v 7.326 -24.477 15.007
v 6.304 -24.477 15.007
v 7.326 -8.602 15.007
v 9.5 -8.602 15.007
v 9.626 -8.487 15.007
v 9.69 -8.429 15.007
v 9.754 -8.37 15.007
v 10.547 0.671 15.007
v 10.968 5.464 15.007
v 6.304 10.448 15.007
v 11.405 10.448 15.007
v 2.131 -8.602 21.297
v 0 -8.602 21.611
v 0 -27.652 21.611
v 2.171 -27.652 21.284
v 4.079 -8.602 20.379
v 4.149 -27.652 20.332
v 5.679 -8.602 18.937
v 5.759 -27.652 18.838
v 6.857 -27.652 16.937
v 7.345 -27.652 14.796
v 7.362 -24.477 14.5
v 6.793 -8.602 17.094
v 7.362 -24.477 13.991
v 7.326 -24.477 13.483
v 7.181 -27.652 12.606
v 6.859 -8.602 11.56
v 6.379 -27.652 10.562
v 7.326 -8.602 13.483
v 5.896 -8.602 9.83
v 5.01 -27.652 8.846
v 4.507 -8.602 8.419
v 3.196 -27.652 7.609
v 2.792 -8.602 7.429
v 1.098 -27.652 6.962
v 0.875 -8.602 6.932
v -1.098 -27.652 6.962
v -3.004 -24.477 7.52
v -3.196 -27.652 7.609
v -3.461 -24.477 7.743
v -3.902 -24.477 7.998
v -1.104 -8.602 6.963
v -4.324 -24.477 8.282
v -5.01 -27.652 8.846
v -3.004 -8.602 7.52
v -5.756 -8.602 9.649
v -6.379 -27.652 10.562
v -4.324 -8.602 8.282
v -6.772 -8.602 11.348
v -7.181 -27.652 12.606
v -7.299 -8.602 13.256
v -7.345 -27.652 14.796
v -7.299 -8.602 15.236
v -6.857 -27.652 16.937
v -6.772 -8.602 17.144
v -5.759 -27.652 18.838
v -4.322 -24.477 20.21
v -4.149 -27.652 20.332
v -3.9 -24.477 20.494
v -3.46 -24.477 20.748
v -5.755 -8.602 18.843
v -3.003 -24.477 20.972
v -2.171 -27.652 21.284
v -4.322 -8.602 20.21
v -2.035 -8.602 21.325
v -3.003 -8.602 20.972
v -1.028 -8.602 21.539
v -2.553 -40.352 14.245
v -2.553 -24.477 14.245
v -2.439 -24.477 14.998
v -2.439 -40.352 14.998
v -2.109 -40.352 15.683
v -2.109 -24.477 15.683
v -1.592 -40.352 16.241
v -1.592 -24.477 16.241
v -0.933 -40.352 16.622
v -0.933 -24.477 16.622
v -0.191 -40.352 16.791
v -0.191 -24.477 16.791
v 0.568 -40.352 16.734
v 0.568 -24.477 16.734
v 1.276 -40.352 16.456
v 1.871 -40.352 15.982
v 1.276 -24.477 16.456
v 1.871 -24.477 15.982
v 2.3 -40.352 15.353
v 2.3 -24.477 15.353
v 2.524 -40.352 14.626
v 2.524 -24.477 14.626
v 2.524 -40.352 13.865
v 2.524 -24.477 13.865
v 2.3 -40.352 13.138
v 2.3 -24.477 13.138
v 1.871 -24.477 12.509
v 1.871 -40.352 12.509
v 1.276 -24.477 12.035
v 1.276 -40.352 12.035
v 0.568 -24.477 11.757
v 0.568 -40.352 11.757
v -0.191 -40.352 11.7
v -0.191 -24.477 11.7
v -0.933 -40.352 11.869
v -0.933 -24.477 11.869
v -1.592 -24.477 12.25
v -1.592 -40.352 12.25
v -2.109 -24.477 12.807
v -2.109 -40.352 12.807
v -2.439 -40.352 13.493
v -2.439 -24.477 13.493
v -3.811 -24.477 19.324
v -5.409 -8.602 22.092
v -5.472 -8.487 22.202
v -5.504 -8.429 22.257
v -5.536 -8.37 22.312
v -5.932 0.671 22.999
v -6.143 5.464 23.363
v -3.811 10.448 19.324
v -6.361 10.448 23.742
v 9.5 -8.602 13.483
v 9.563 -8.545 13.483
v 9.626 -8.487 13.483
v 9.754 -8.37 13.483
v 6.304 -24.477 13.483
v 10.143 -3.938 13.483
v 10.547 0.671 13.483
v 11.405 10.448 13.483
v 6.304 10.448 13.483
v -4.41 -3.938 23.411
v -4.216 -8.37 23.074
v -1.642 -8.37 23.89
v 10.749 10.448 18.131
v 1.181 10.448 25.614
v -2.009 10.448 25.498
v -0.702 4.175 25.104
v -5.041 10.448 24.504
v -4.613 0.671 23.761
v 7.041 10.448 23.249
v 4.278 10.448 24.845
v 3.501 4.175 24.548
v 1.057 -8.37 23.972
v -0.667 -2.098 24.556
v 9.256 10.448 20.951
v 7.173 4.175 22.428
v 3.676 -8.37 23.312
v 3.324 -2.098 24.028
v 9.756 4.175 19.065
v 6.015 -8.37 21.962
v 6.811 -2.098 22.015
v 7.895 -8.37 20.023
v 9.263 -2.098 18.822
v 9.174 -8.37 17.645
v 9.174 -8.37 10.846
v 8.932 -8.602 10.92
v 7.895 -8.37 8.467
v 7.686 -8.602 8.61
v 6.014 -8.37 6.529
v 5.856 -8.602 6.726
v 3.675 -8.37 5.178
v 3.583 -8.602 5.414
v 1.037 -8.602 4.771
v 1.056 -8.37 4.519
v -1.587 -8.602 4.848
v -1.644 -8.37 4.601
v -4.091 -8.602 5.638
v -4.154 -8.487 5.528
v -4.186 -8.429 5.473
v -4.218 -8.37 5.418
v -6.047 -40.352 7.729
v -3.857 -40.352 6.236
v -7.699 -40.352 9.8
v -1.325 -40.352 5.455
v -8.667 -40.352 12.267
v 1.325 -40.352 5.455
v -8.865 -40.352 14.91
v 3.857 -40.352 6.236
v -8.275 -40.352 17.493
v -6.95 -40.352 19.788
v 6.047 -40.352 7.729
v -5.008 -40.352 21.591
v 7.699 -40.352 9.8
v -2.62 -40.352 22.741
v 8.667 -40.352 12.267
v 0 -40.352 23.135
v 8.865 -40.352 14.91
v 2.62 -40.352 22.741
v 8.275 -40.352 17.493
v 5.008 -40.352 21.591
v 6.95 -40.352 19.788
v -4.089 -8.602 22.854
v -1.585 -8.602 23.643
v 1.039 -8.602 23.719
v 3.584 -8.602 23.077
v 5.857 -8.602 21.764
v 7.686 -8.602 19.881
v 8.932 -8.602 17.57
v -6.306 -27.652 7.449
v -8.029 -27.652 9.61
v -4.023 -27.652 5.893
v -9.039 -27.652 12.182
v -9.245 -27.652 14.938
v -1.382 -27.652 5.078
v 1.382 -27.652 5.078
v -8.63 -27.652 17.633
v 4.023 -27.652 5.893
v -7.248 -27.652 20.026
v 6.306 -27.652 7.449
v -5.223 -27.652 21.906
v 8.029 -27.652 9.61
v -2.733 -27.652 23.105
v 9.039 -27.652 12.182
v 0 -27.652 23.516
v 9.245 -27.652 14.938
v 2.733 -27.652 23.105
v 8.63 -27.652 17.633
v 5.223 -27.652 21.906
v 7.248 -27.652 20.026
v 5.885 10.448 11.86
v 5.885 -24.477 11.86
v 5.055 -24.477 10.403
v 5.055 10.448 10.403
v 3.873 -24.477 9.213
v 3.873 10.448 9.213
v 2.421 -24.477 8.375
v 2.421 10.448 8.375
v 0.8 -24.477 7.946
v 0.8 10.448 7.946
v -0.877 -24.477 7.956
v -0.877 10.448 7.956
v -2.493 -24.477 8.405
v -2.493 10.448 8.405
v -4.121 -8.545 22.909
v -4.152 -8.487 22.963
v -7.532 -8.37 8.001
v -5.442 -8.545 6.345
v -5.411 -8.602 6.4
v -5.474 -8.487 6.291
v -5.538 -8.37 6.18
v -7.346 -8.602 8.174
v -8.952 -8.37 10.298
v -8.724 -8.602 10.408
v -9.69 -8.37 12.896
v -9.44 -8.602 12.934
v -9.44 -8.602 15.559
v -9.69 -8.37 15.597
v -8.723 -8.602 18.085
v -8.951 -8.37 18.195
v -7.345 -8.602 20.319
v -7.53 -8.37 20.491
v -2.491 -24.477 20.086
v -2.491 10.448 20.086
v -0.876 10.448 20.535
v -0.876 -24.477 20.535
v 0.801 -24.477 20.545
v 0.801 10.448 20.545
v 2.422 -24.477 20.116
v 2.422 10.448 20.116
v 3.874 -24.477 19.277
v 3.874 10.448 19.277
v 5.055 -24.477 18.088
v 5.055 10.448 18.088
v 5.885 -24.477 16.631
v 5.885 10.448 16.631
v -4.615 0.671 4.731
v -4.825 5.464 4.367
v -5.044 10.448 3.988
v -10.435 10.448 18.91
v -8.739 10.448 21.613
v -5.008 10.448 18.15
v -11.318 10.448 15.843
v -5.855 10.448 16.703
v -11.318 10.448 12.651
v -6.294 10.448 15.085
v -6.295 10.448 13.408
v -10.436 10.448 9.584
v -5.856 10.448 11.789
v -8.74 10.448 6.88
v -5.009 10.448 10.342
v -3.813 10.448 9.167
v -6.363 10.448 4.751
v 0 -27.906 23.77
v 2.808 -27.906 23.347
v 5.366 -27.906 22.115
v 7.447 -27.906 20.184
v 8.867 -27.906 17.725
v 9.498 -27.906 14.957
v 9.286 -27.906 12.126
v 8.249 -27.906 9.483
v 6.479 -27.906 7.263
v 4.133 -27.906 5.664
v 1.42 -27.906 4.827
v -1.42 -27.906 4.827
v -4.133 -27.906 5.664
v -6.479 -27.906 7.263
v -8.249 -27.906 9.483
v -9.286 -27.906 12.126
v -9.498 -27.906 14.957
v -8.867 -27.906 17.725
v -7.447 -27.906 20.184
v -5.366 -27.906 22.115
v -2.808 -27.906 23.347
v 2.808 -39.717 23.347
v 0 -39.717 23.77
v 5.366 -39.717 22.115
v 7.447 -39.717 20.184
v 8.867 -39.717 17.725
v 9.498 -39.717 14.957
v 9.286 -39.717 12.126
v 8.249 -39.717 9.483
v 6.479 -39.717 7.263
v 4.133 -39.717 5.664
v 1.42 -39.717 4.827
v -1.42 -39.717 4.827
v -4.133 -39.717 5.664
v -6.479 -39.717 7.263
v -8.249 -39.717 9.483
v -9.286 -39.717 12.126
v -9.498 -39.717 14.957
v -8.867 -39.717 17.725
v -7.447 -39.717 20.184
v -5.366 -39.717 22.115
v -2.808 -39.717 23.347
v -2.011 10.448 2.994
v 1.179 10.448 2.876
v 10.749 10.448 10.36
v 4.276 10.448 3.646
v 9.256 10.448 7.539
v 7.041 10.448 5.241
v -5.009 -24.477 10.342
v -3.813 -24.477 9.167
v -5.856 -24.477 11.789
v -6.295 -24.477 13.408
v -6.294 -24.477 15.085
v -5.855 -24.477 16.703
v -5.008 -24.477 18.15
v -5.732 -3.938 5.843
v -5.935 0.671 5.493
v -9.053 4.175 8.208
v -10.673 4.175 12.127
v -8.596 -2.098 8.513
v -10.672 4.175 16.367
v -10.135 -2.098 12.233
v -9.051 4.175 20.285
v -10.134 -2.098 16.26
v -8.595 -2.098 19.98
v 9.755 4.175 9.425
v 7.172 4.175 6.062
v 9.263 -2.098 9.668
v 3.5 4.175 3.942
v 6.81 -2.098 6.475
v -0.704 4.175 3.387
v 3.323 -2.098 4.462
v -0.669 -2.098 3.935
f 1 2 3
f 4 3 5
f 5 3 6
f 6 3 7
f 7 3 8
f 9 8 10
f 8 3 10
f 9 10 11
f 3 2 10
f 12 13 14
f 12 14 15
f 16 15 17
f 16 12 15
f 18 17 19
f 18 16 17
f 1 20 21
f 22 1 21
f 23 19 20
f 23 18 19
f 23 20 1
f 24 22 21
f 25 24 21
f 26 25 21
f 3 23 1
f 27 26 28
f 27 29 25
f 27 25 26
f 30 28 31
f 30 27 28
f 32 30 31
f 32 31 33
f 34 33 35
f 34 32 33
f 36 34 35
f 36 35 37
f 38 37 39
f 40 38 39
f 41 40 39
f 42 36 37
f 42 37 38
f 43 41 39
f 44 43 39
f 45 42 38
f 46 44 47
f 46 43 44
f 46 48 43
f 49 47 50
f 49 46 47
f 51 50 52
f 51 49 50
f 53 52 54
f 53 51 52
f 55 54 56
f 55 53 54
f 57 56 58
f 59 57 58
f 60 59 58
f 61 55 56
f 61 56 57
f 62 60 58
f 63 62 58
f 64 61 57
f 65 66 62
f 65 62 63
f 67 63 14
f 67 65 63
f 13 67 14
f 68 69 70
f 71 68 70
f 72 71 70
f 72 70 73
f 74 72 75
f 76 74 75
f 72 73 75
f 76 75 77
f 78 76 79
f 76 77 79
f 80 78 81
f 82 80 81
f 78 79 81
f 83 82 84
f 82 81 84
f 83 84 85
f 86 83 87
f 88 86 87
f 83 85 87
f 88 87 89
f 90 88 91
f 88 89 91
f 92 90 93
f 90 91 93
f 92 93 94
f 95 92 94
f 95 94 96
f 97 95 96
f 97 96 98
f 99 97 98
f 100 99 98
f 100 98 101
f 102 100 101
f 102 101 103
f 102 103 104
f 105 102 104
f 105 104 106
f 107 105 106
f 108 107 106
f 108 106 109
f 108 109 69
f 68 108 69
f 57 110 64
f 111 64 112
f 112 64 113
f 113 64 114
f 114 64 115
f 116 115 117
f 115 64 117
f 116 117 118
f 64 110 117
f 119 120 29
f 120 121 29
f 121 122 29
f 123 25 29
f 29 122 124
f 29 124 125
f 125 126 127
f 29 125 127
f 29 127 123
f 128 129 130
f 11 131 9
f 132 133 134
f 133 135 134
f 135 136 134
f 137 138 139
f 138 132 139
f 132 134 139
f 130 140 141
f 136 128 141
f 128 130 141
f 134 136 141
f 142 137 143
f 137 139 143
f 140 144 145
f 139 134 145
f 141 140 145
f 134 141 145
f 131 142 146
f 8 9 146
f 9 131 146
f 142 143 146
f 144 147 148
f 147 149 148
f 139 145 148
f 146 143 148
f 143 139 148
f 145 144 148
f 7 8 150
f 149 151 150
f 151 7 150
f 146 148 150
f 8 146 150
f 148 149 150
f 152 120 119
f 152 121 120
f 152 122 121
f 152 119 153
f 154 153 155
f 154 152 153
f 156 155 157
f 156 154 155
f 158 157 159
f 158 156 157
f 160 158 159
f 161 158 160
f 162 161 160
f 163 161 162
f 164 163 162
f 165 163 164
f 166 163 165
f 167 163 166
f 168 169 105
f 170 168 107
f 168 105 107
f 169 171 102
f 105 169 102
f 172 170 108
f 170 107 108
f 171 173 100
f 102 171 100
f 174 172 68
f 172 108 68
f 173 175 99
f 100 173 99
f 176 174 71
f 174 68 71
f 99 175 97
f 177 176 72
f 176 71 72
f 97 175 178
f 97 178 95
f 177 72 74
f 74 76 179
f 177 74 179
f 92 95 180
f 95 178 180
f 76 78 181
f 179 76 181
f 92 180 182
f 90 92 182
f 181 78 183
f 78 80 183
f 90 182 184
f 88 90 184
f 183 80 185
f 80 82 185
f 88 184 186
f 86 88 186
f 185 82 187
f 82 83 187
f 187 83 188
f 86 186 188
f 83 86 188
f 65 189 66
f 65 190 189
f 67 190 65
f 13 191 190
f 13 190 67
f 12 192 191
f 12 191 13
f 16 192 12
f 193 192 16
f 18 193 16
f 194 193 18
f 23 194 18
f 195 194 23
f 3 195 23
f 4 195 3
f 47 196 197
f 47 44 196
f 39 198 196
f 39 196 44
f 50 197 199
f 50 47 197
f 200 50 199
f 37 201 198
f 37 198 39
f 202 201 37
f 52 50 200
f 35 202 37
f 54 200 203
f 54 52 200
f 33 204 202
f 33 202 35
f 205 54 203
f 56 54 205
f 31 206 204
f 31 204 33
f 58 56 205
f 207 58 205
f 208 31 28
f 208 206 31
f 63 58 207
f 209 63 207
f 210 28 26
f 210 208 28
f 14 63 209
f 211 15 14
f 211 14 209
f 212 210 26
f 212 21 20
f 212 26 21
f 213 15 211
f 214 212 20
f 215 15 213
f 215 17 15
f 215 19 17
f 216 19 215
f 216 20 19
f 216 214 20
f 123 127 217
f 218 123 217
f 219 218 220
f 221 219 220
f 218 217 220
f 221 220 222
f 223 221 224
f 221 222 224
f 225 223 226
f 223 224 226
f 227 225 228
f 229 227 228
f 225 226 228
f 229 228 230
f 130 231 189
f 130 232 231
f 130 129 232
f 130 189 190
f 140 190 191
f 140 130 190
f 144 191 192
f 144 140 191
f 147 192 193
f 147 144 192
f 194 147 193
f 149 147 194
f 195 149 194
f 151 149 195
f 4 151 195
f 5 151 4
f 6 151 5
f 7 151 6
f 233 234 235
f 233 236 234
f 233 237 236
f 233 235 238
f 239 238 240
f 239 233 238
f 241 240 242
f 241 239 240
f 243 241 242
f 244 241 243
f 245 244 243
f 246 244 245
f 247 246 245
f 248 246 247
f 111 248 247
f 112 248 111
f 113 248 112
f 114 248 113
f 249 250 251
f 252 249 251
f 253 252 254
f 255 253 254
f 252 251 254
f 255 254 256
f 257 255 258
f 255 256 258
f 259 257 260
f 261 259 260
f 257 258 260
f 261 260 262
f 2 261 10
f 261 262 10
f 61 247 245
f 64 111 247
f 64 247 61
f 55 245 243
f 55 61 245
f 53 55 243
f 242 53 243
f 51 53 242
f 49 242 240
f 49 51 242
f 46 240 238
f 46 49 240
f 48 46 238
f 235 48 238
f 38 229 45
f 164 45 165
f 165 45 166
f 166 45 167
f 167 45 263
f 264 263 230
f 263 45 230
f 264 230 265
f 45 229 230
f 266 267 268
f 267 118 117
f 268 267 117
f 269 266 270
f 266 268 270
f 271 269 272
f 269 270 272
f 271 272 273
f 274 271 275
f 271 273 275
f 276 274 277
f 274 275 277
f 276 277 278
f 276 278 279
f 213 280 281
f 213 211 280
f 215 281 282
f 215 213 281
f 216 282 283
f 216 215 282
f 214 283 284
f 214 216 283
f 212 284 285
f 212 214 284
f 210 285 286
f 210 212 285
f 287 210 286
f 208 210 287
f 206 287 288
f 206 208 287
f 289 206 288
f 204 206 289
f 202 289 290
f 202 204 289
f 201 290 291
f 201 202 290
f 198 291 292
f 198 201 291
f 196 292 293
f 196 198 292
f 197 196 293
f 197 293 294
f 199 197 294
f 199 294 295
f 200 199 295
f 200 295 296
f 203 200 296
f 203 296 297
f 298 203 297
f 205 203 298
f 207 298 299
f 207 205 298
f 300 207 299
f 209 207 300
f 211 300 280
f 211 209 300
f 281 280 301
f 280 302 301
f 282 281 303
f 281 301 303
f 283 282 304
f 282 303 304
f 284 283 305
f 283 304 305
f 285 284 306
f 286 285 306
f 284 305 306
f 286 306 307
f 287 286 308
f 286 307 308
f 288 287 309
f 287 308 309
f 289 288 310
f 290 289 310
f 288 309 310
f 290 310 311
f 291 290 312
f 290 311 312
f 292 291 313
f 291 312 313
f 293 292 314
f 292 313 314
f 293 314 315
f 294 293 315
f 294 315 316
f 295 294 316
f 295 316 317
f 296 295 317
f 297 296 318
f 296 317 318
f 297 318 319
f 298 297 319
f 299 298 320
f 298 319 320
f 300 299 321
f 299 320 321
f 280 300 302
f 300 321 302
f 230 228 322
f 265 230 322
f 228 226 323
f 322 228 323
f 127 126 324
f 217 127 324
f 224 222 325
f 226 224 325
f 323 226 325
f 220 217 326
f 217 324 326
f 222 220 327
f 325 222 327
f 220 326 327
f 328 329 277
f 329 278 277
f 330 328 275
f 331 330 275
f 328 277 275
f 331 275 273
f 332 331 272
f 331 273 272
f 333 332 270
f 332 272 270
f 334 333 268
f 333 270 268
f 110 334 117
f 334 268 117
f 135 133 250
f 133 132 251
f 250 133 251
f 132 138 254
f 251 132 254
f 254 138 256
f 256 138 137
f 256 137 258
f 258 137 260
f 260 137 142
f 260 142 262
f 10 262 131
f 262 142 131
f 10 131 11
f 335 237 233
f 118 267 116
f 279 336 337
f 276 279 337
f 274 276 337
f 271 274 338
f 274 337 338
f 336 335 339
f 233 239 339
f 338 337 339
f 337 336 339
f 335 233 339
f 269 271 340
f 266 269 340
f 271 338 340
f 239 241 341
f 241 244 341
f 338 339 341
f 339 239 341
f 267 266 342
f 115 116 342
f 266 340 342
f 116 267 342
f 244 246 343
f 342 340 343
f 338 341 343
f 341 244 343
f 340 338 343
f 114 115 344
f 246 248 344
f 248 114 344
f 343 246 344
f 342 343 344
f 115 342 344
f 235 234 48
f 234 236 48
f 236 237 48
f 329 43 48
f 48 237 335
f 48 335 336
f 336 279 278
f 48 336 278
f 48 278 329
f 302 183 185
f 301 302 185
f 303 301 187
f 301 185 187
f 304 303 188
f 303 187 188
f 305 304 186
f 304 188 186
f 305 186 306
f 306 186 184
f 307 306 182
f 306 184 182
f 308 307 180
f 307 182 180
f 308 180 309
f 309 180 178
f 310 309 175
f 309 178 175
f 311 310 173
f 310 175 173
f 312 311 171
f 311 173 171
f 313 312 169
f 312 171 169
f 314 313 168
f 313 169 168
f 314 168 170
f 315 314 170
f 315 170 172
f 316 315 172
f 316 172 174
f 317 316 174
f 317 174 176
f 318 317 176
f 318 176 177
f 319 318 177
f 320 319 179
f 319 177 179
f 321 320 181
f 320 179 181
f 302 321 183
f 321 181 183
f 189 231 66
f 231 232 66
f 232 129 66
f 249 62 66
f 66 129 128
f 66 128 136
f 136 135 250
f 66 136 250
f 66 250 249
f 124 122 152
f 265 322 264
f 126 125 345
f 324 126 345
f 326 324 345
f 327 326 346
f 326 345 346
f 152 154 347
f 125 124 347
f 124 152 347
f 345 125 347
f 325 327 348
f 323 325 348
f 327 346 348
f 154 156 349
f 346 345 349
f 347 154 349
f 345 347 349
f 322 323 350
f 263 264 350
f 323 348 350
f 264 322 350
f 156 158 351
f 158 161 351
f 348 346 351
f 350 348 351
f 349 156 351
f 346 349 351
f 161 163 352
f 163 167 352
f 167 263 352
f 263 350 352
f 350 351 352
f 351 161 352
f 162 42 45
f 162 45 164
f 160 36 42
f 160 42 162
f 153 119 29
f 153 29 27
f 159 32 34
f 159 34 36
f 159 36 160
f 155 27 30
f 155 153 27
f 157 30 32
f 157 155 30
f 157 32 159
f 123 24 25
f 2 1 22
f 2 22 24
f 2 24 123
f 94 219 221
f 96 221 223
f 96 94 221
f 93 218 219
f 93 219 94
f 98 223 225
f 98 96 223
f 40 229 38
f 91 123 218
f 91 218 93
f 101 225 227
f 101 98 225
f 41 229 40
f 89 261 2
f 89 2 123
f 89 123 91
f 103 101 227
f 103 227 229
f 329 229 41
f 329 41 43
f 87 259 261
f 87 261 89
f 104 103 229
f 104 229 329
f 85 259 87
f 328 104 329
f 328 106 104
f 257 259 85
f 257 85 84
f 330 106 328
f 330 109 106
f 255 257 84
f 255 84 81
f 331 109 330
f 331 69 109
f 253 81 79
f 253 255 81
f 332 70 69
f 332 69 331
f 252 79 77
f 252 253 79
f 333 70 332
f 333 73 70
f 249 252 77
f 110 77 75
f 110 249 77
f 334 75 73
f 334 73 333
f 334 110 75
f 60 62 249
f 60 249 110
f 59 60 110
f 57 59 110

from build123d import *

# Parameters (mm, degrees)
F2_R         = 6.35
F3_DEPTH     = 34.925
F5_D         = 5.1054
F9_DEPTH     = 34.925
F10_SIZE     = 0.635
F11_T4_ANGLE = 118.0970990721
F11_T6_ANGLE = 118.1103265481
F11_T8_ANGLE = 118.1037128101


# Not quite as in the source:
# - a fillet or chamfer that OpenCascade refuses, or shapes differently, is made with other operations: its cross-section is extruded or revolved along the edge and cut away or added


with BuildPart() as f1:
    # F0 (on Right) → F1 (revolve)
    with BuildSketch(Plane.YZ):
        Polygon((-11.3264165741, 23.7704595025), (-40.3521669373, 23.7704595025), (-40.3521669373, 14.2454595025), (10.4478330627, 14.2454595025), (10.4478330627, 25.6754595025), align=None)
    revolve(axis=Axis((0, -14.9521669373, 14.2454595025), (0, 1, 0)))

    # F2 (on face) → F3 (cut)
    with BuildSketch(Plane(origin=(0, 10.4478330627, 0), x_dir=(-1, 0, 0), z_dir=(0, 1, 0))):
        with Locations((0, 14.2454595025)):
            Circle(F2_R)
    extrude(amount=-F3_DEPTH, mode=Mode.SUBTRACT)

    # F5 (through all)
    with Locations(Plane.XZ.offset(40.3521669373)):
        with Locations((0, 14.2454595025)):
            Hole(F5_D / 2)

    # F6 (on Right) → F7 (revolve, cut)
    with BuildSketch(Plane.YZ):
        Polygon((-11.3264165741, 23.7704595025), (-27.6521669373, 23.7704595025), (-27.6521669373, 21.6114595025), (-8.6021669373, 21.6114595025), (-8.6021669373, 24.0088004624), align=None)
    revolve(axis=Axis((0, -14.9521669373, 14.2454595025), (0, 1, 0)), mode=Mode.SUBTRACT)

    # F8 (on face) → F9 (cut)
    with BuildSketch(Plane(origin=(0, 10.4478330627, 0), x_dir=(-1, 0, 0), z_dir=(0, 1, 0))):
        with BuildLine():
            Line((-6.3041142122, 15.0074595025), (-11.4045717149, 15.0074595025))
            ThreePointArc((-11.4045717149, 15.0074595025), (-11.43, 14.2454595025), (-11.4045717149, 13.4834595025))
            Line((-11.4045717149, 13.4834595025), (-6.3041142122, 13.4834595025))
            ThreePointArc((-6.3041142122, 13.4834595025), (-6.35, 14.2454595025), (-6.3041142122, 15.0074595025))
        make_face()
        with BuildLine():
            Line((3.8113822624, 19.3244225118), (6.3611011609, 23.7418426046))
            ThreePointArc((6.3611011609, 23.7418426046), (5.7138574323, 24.1447894416), (5.0411905024, 24.5036902622))
            Line((5.0411905024, 24.5036902622), (2.4914716038, 20.0862701695))
            ThreePointArc((2.4914716038, 20.0862701695), (3.1743652402, 19.7450872465), (3.8113822624, 19.3244225118))
        make_face()
        with BuildLine():
            ThreePointArc((5.04355843, 3.9883927501), (5.7161424915, 4.347448843), (6.3632931846, 4.7505450823))
            Line((6.3632931846, 4.7505450823), (3.8125546144, 9.1673764673))
            ThreePointArc((3.8125546144, 9.1673764673), (3.1756347175, 8.7465646917), (2.4928198598, 8.4052241351))
            Line((2.4928198598, 8.4052241351), (5.04355843, 3.9883927501))
        make_face()
    extrude(amount=-F9_DEPTH, mode=Mode.SUBTRACT)

    # F10
    f10_edges = [f1.edges().sort_by_distance(p)[0] for p in [
        (0, -40.352167, 4.72046),
    ]]
    chamfer(f10_edges, length=F10_SIZE)

    # F11: chamfer of 0.254 on 4 edges, made by hand

    # F11_s1 → F11_t2 (revolve, cut)
    with BuildSketch(Plane.YZ):
        Polygon((-27.9061669373, 23.7704595025), (-27.6521669373, 23.5164595025), (-27.6521669373, 23.7704595025), align=None)
    revolve(axis=Axis((0, -27.6521669373, 14.2454595025), (0, 1, 0)), mode=Mode.SUBTRACT)

    # F11_s3 → F11_t4 (revolve, cut)
    with BuildSketch(Plane(origin=(6.0463708023, 0, 3.3578022312), x_dir=(0, 1, 0), z_dir=(-0.8742366104, 0, -0.485500102))):
        Polygon((-8.6021669373, -21.9844950709), (-8.3703044959, -22.2375285242), (-8.6021669373, -22.2172431891), align=None)
    revolve(axis=Axis((0, -8.6021669373, 14.2454595025), (0, 1, 0)), revolution_arc=F11_T4_ANGLE, mode=Mode.SUBTRACT)

    # F11_s5 → F11_t6 (revolve, cut)
    with BuildSketch(Plane(origin=(0.2356940066, 0, 14.2415588295), x_dir=(0, 1, 0), z_dir=(0.0165474678, 0, 0.9998630813))):
        Polygon((-8.6021669373, -9.2948665597), (-8.3703044959, -9.547900013), (-8.6021669373, -9.5276146779), align=None)
    revolve(axis=Axis((0, -8.6021669373, 14.2454595025), (0, 1, 0)), revolution_arc=F11_T6_ANGLE, mode=Mode.SUBTRACT)

    # F11_s7 → F11_t8 (revolve, cut)
    with BuildSketch(Plane(origin=(-6.2837082468, 0, 3.7688827395), x_dir=(0, 1, 0), z_dir=(0.8575737294, 0, -0.5143610587))):
        Polygon((-8.6021669373, 2.6859389904), (-8.3703044959, 2.4329055371), (-8.6021669373, 2.4531908722), align=None)
    revolve(axis=Axis((0, -8.6021669373, 14.2454595025), (0, 1, 0)), revolution_arc=F11_T8_ANGLE, mode=Mode.SUBTRACT)


solid = f1.part
